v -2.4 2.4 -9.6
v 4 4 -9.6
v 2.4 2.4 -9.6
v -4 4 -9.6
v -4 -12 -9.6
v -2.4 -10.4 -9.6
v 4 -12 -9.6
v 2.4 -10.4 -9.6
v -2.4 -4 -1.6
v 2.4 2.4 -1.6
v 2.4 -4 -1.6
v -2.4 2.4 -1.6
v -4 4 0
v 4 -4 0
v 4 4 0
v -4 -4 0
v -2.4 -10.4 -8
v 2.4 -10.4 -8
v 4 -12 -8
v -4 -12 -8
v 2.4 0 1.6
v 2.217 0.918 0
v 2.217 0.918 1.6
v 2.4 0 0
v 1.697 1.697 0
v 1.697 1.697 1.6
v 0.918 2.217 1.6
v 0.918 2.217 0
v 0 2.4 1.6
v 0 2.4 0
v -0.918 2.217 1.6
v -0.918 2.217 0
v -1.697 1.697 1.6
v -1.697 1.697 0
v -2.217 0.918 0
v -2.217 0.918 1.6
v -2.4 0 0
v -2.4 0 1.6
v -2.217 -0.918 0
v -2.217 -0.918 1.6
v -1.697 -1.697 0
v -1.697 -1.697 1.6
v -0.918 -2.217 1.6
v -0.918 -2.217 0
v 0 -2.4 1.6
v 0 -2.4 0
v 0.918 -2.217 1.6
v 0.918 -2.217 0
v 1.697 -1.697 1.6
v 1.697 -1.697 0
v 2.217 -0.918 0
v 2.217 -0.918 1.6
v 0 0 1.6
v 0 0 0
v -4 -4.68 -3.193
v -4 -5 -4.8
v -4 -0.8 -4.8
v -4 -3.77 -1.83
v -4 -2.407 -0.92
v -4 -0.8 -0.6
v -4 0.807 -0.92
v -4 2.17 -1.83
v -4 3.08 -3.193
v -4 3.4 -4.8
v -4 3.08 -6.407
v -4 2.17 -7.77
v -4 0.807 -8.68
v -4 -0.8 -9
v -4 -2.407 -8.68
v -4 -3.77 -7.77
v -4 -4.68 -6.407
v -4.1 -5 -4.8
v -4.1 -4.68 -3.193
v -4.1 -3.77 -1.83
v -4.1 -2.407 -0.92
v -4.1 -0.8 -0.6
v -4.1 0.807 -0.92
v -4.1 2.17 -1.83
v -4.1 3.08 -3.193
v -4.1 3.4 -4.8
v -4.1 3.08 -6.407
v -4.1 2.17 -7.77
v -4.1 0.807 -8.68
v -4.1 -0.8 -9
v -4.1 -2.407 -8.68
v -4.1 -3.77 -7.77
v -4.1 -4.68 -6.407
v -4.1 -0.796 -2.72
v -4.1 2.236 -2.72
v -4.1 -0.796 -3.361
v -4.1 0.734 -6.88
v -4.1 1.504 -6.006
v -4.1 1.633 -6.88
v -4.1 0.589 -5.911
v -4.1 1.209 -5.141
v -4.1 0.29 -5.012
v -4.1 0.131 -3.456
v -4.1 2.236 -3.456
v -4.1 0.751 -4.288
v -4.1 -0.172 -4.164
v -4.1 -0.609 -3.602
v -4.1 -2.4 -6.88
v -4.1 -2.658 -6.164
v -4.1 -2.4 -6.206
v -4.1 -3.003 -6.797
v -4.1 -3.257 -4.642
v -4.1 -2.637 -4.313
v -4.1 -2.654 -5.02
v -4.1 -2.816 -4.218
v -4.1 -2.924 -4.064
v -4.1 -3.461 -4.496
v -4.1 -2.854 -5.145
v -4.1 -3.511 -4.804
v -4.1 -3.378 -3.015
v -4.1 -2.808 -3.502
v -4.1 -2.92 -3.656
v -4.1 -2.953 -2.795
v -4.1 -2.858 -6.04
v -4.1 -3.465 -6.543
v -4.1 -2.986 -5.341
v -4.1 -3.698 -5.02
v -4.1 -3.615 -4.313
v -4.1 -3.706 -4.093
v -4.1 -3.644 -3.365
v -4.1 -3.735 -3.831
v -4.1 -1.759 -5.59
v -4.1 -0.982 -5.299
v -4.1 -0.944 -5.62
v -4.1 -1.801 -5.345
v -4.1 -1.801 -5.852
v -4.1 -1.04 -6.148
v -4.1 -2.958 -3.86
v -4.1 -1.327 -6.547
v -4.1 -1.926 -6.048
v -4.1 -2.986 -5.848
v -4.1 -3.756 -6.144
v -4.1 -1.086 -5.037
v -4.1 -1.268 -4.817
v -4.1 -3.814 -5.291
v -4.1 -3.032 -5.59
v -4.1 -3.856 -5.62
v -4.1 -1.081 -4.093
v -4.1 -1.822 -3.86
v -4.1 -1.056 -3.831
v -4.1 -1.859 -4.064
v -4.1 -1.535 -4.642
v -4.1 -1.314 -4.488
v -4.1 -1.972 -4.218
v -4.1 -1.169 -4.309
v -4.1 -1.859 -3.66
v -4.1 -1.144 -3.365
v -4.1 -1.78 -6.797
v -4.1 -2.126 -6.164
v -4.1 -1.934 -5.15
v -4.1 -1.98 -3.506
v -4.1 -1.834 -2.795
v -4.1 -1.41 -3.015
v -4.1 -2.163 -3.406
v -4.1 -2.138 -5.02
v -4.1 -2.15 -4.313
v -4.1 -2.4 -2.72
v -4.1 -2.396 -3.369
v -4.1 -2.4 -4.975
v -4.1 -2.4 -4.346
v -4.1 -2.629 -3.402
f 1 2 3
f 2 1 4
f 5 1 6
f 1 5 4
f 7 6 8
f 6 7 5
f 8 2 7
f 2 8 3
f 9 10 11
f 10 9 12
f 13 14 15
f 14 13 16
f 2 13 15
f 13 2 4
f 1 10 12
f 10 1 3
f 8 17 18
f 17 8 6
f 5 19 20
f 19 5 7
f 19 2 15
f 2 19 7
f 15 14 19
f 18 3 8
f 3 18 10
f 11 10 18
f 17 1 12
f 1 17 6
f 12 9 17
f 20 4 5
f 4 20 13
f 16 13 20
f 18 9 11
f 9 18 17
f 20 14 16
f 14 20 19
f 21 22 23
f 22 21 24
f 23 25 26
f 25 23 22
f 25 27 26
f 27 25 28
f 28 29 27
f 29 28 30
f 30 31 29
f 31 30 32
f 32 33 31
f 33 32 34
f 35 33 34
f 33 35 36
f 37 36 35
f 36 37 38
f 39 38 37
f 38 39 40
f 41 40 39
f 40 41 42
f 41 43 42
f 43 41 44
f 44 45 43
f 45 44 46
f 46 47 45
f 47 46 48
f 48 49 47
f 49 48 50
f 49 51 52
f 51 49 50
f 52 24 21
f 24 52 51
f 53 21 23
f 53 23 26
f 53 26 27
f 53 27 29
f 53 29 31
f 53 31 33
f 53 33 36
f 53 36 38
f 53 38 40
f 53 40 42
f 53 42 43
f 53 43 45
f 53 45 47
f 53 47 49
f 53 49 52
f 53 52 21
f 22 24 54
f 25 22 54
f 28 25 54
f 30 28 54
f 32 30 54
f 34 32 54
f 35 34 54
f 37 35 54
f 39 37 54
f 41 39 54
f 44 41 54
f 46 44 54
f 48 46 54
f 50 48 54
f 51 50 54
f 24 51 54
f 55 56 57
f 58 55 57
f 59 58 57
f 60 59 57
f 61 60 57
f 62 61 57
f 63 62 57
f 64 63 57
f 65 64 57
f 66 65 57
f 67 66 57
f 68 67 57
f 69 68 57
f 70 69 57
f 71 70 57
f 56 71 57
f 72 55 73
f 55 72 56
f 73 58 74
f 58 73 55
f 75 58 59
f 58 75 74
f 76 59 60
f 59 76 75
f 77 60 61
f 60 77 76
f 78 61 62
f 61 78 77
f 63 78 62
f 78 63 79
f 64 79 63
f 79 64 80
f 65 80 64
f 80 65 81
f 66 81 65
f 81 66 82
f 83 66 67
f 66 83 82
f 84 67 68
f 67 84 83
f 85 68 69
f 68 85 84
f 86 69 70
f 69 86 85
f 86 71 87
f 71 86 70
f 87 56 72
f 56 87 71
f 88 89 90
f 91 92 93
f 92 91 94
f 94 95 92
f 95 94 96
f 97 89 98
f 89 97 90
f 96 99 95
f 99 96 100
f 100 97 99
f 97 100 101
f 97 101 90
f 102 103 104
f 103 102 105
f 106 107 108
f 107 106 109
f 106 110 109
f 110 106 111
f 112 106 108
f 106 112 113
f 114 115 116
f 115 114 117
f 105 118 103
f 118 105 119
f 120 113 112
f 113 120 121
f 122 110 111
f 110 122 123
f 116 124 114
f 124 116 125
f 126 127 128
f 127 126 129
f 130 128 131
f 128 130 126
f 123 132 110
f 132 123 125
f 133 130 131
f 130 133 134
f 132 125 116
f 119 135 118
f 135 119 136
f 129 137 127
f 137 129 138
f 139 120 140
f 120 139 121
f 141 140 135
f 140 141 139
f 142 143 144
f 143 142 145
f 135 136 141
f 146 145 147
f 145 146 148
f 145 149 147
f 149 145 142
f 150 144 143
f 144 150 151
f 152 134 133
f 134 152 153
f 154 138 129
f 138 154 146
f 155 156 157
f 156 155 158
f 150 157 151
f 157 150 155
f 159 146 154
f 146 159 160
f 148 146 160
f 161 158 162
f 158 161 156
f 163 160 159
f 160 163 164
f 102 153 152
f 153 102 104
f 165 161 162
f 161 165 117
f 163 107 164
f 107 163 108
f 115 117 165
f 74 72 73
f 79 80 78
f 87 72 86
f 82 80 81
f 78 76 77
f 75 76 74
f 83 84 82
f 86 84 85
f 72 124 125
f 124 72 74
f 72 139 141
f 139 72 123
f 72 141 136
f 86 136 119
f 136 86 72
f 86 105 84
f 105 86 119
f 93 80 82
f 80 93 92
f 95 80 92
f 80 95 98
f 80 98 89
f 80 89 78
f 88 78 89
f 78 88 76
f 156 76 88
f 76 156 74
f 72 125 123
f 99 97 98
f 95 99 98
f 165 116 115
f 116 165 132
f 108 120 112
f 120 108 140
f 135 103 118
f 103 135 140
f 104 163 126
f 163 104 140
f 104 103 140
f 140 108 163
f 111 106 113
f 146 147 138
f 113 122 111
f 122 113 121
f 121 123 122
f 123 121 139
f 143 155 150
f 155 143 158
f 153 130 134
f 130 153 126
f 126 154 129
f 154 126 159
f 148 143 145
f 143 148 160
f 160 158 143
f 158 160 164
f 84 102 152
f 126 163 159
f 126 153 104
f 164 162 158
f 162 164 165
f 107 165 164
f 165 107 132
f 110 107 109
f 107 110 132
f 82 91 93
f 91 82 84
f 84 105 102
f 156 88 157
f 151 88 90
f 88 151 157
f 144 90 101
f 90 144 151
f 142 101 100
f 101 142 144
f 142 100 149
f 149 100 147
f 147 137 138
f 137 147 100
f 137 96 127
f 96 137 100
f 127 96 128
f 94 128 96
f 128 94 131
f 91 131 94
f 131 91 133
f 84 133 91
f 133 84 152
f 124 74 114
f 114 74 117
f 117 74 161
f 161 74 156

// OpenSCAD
// file: ../p/4-4edge.scad
use <../lib.scad>
function ldraw_lib__4_4edge() = [
// 0 Circle 1.0
// 0 Name: 4-4edge.dat
// 0 Author: James Jessiman
// 0 !LDRAW_ORG Primitive UPDATE 2017-01
// 0 !LICENSE Licensed under CC BY 2.0 and CC BY 4.0 : see CAreadme.txt
// 
// 0 BFC CERTIFY CCW
  [0,"BFC","CERTIFY"],
  [0,"BFC","CCW"],
// 
// 0 !HISTORY 1998-12-15 [PTadmin] Official Update 1998-10
// 0 !HISTORY 2005-12-28 [PTadmin] Official Update 2005-01
// 0 !HISTORY 2007-06-24 [PTadmin] Header formatted for Contributor Agreement
// 0 !HISTORY 2008-07-01 [PTadmin] Official Update 2008-01
// 0 !HISTORY 2017-01-15 [Steffen] BFCed
// 0 !HISTORY 2017-12-30 [PTadmin] Official Update 2017-01
// 
// 
// 2 24 1 0 0 0.9239 0 0.3827
  [2,24,1,0,0,0.9239,0,0.3827],
// 2 24 0.9239 0 0.3827 0.7071 0 0.7071
  [2,24,0.9239,0,0.3827,0.7071,0,0.7071],
// 2 24 0.7071 0 0.7071 0.3827 0 0.9239
  [2,24,0.7071,0,0.7071,0.3827,0,0.9239],
// 2 24 0.3827 0 0.9239 0 0 1
  [2,24,0.3827,0,0.9239,0,0,1],
// 2 24 0 0 1 -0.3827 0 0.9239
  [2,24,0,0,1,-0.3827,0,0.9239],
// 2 24 -0.3827 0 0.9239 -0.7071 0 0.7071
  [2,24,-0.3827,0,0.9239,-0.7071,0,0.7071],
// 2 24 -0.7071 0 0.7071 -0.9239 0 0.3827
  [2,24,-0.7071,0,0.7071,-0.9239,0,0.3827],
// 2 24 -0.9239 0 0.3827 -1 0 -0
  [2,24,-0.9239,0,0.3827,-1,0,-0],
// 2 24 -1 0 -0 -0.9239 0 -0.3827
  [2,24,-1,0,-0,-0.9239,0,-0.3827],
// 2 24 -0.9239 0 -0.3827 -0.7071 0 -0.7071
  [2,24,-0.9239,0,-0.3827,-0.7071,0,-0.7071],
// 2 24 -0.7071 0 -0.7071 -0.3827 0 -0.9239
  [2,24,-0.7071,0,-0.7071,-0.3827,0,-0.9239],
// 2 24 -0.3827 0 -0.9239 0 0 -1
  [2,24,-0.3827,0,-0.9239,0,0,-1],
// 2 24 0 0 -1 0.3827 0 -0.9239
  [2,24,0,0,-1,0.3827,0,-0.9239],
// 2 24 0.3827 0 -0.9239 0.7071 0 -0.7071
  [2,24,0.3827,0,-0.9239,0.7071,0,-0.7071],
// 2 24 0.7071 0 -0.7071 0.9239 0 -0.3827
  [2,24,0.7071,0,-0.7071,0.9239,0,-0.3827],
// 2 24 0.9239 0 -0.3827 1 0 0
  [2,24,0.9239,0,-0.3827,1,0,0],
];
module ldraw_lib__4_4edge(step=0, col=false, unit=2/5, alt=false, line=0.2, solid=!$preview)
    makepoly(ldraw_lib__4_4edge(), step=step, col=col, unit=unit, alt=alt, line=line, solid=solid);
ldraw_lib__4_4edge(line=0.2);
// file: ../p/4-4disc.scad
use <../lib.scad>
function ldraw_lib__4_4disc() = [
// 0 Disc 1.0
// 0 Name: 4-4disc.dat
// 0 Author: James Jessiman
// 0 !LDRAW_ORG Primitive UPDATE 2002-02
// 0 !LICENSE Licensed under CC BY 2.0 and CC BY 4.0 : see CAreadme.txt
// 
// 0 BFC CERTIFY CCW
  [0,"BFC","CERTIFY"],
  [0,"BFC","CCW"],
// 
// 0 !HISTORY 1998-12-15 [PTadmin] Official Update 1998-10
// 0 !HISTORY 2002-03-23 [sbliss] Added BFC statement
// 0 !HISTORY 2002-04-25 [PTadmin] Official Update 2002-02
// 0 !HISTORY 2007-06-24 [PTadmin] Header formatted for Contributor Agreement
// 0 !HISTORY 2008-07-01 [PTadmin] Official Update 2008-01
// 
// 
// 3 16 0 0 0 1 0 0 0.9239 0 0.3827
  [3,16,0,0,0,1,0,0,0.9239,0,0.3827],
// 3 16 0 0 0 0.9239 0 0.3827 0.7071 0 0.7071
  [3,16,0,0,0,0.9239,0,0.3827,0.7071,0,0.7071],
// 3 16 0 0 0 0.7071 0 0.7071 0.3827 0 0.9239
  [3,16,0,0,0,0.7071,0,0.7071,0.3827,0,0.9239],
// 3 16 0 0 0 0.3827 0 0.9239 0 0 1
  [3,16,0,0,0,0.3827,0,0.9239,0,0,1],
// 3 16 0 0 0 0 0 1 -0.3827 0 0.9239
  [3,16,0,0,0,0,0,1,-0.3827,0,0.9239],
// 3 16 0 0 0 -0.3827 0 0.9239 -0.7071 0 0.7071
  [3,16,0,0,0,-0.3827,0,0.9239,-0.7071,0,0.7071],
// 3 16 0 0 0 -0.7071 0 0.7071 -0.9239 0 0.3827
  [3,16,0,0,0,-0.7071,0,0.7071,-0.9239,0,0.3827],
// 3 16 0 0 0 -0.9239 0 0.3827 -1 0 -0
  [3,16,0,0,0,-0.9239,0,0.3827,-1,0,-0],
// 3 16 0 0 0 -1 0 -0 -0.9239 0 -0.3827
  [3,16,0,0,0,-1,0,-0,-0.9239,0,-0.3827],
// 3 16 0 0 0 -0.9239 0 -0.3827 -0.7071 0 -0.7071
  [3,16,0,0,0,-0.9239,0,-0.3827,-0.7071,0,-0.7071],
// 3 16 0 0 0 -0.7071 0 -0.7071 -0.3827 0 -0.9239
  [3,16,0,0,0,-0.7071,0,-0.7071,-0.3827,0,-0.9239],
// 3 16 0 0 0 -0.3827 0 -0.9239 0 0 -1
  [3,16,0,0,0,-0.3827,0,-0.9239,0,0,-1],
// 3 16 0 0 0 0 0 -1 0.3827 0 -0.9239
  [3,16,0,0,0,0,0,-1,0.3827,0,-0.9239],
// 3 16 0 0 0 0.3827 0 -0.9239 0.7071 0 -0.7071
  [3,16,0,0,0,0.3827,0,-0.9239,0.7071,0,-0.7071],
// 3 16 0 0 0 0.7071 0 -0.7071 0.9239 0 -0.3827
  [3,16,0,0,0,0.7071,0,-0.7071,0.9239,0,-0.3827],
// 3 16 0 0 0 0.9239 0 -0.3827 1 0 0
  [3,16,0,0,0,0.9239,0,-0.3827,1,0,0],
// 0
];
module ldraw_lib__4_4disc(step=0, col=false, unit=2/5, alt=false, line=0.2, solid=!$preview)
    makepoly(ldraw_lib__4_4disc(), step=step, col=col, unit=unit, alt=alt, line=line, solid=solid);
ldraw_lib__4_4disc(line=0.2);
// file: ../p/4-4cyli.scad
use <../lib.scad>
$fa=1; $fs=0.2;
function ldraw_lib__4_4cyli(realsolid=false) = [
// 0 Cylinder 1.0
// 0 Name: 4-4cyli.dat
// 0 Author: James Jessiman
// 0 !LDRAW_ORG Primitive UPDATE 2005-01
// 0 !LICENSE Licensed under CC BY 2.0 and CC BY 4.0 : see CAreadme.txt
// 
// 0 BFC CERTIFY CCW
  [0,"BFC","CERTIFY"],
  [0,"BFC","CCW"],
// 
// 0 !HISTORY 1998-12-15 [PTadmin] Official Update 1998-10
// 0 !HISTORY 2002-03-23 [sbliss] Added BFC statement; merged headers from files in distributions LDraw 0.27 and Complete.
// 0 !HISTORY 2002-04-25 [PTadmin] Official Update 2002-02
// 0 !HISTORY 2004-12-14 [guyvivan] BFC CCW
// 0 !HISTORY 2005-12-28 [PTadmin] Official Update 2005-01
// 0 !HISTORY 2007-06-24 [PTadmin] Header formatted for Contributor Agreement
// 0 !HISTORY 2008-07-01 [PTadmin] Official Update 2008-01
// 
// 
// 4 16 1 1 0 0.9239 1 0.3827 0.9239 0 0.3827 1 0 0
  [4,16,1,1,0,0.9239,1,0.3827,0.9239,0,0.3827,1,0,0],
// 5 24 1 0 0 1 1 0 0.9239 0 0.3827 0.9239 0 -0.3827
  [5,24,1,0,0,1,1,0,0.9239,0,0.3827,0.9239,0,-0.3827],
// 4 16 0.9239 1 0.3827 0.7071 1 0.7071 0.7071 0 0.7071 0.9239 0 0.3827
  [4,16,0.9239,1,0.3827,0.7071,1,0.7071,0.7071,0,0.7071,0.9239,0,0.3827],
// 5 24 0.9239 0 0.3827 0.9239 1 0.3827 0.7071 0 0.7071 1 0 0
  [5,24,0.9239,0,0.3827,0.9239,1,0.3827,0.7071,0,0.7071,1,0,0],
// 4 16 0.7071 1 0.7071 0.3827 1 0.9239 0.3827 0 0.9239 0.7071 0 0.7071
  [4,16,0.7071,1,0.7071,0.3827,1,0.9239,0.3827,0,0.9239,0.7071,0,0.7071],
// 5 24 0.7071 0 0.7071 0.7071 1 0.7071 0.3827 0 0.9239 0.9239 0 0.3827
  [5,24,0.7071,0,0.7071,0.7071,1,0.7071,0.3827,0,0.9239,0.9239,0,0.3827],
// 4 16 0.3827 1 0.9239 0 1 1 0 0 1 0.3827 0 0.9239
  [4,16,0.3827,1,0.9239,0,1,1,0,0,1,0.3827,0,0.9239],
// 5 24 0.3827 0 0.9239 0.3827 1 0.9239 0 0 1 0.7071 0 0.7071
  [5,24,0.3827,0,0.9239,0.3827,1,0.9239,0,0,1,0.7071,0,0.7071],
// 4 16 0 1 1 -0.3827 1 0.9239 -0.3827 0 0.9239 0 0 1
  [4,16,0,1,1,-0.3827,1,0.9239,-0.3827,0,0.9239,0,0,1],
// 5 24 0 0 1 0 1 1 -0.3827 0 0.9239 0.3827 0 0.9239
  [5,24,0,0,1,0,1,1,-0.3827,0,0.9239,0.3827,0,0.9239],
// 4 16 -0.3827 1 0.9239 -0.7071 1 0.7071 -0.7071 0 0.7071 -0.3827 0 0.9239
  [4,16,-0.3827,1,0.9239,-0.7071,1,0.7071,-0.7071,0,0.7071,-0.3827,0,0.9239],
// 5 24 -0.3827 0 0.9239 -0.3827 1 0.9239 -0.7071 0 0.7071 0 0 1
  [5,24,-0.3827,0,0.9239,-0.3827,1,0.9239,-0.7071,0,0.7071,0,0,1],
// 4 16 -0.7071 1 0.7071 -0.9239 1 0.3827 -0.9239 0 0.3827 -0.7071 0 0.7071
  [4,16,-0.7071,1,0.7071,-0.9239,1,0.3827,-0.9239,0,0.3827,-0.7071,0,0.7071],
// 5 24 -0.7071 0 0.7071 -0.7071 1 0.7071 -0.9239 0 0.3827 -0.3827 0 0.9239
  [5,24,-0.7071,0,0.7071,-0.7071,1,0.7071,-0.9239,0,0.3827,-0.3827,0,0.9239],
// 4 16 -0.9239 1 0.3827 -1 1 0 -1 0 0 -0.9239 0 0.3827
  [4,16,-0.9239,1,0.3827,-1,1,0,-1,0,0,-0.9239,0,0.3827],
// 5 24 -0.9239 0 0.3827 -0.9239 1 0.3827 -1 0 0 -0.7071 0 0.7071
  [5,24,-0.9239,0,0.3827,-0.9239,1,0.3827,-1,0,0,-0.7071,0,0.7071],
// 4 16 -1 1 0 -0.9239 1 -0.3827 -0.9239 0 -0.3827 -1 0 0
  [4,16,-1,1,0,-0.9239,1,-0.3827,-0.9239,0,-0.3827,-1,0,0],
// 5 24 -1 0 0 -1 1 0 -0.9239 0 -0.3827 -0.9239 0 0.3827
  [5,24,-1,0,0,-1,1,0,-0.9239,0,-0.3827,-0.9239,0,0.3827],
// 4 16 -0.9239 1 -0.3827 -0.7071 1 -0.7071 -0.7071 0 -0.7071 -0.9239 0 -0.3827
  [4,16,-0.9239,1,-0.3827,-0.7071,1,-0.7071,-0.7071,0,-0.7071,-0.9239,0,-0.3827],
// 5 24 -0.9239 0 -0.3827 -0.9239 1 -0.3827 -0.7071 0 -0.7071 -1 0 0
  [5,24,-0.9239,0,-0.3827,-0.9239,1,-0.3827,-0.7071,0,-0.7071,-1,0,0],
// 4 16 -0.7071 1 -0.7071 -0.3827 1 -0.9239 -0.3827 0 -0.9239 -0.7071 0 -0.7071
  [4,16,-0.7071,1,-0.7071,-0.3827,1,-0.9239,-0.3827,0,-0.9239,-0.7071,0,-0.7071],
// 5 24 -0.7071 0 -0.7071 -0.7071 1 -0.7071 -0.3827 0 -0.9239 -0.9239 0 -0.3827
  [5,24,-0.7071,0,-0.7071,-0.7071,1,-0.7071,-0.3827,0,-0.9239,-0.9239,0,-0.3827],
// 4 16 -0.3827 1 -0.9239 0 1 -1 0 0 -1 -0.3827 0 -0.9239
  [4,16,-0.3827,1,-0.9239,0,1,-1,0,0,-1,-0.3827,0,-0.9239],
// 5 24 -0.3827 0 -0.9239 -0.3827 1 -0.9239 0 0 -1 -0.7071 0 -0.7071
  [5,24,-0.3827,0,-0.9239,-0.3827,1,-0.9239,0,0,-1,-0.7071,0,-0.7071],
// 4 16 0 1 -1 0.3827 1 -0.9239 0.3827 0 -0.9239 0 0 -1
  [4,16,0,1,-1,0.3827,1,-0.9239,0.3827,0,-0.9239,0,0,-1],
// 5 24 0 0 -1 0 1 -1 0.3827 0 -0.9239 -0.3827 0 -0.9239
  [5,24,0,0,-1,0,1,-1,0.3827,0,-0.9239,-0.3827,0,-0.9239],
// 4 16 0.3827 1 -0.9239 0.7071 1 -0.7071 0.7071 0 -0.7071 0.3827 0 -0.9239
  [4,16,0.3827,1,-0.9239,0.7071,1,-0.7071,0.7071,0,-0.7071,0.3827,0,-0.9239],
// 5 24 0.3827 0 -0.9239 0.3827 1 -0.9239 0.7071 0 -0.7071 0 0 -1
  [5,24,0.3827,0,-0.9239,0.3827,1,-0.9239,0.7071,0,-0.7071,0,0,-1],
// 4 16 0.7071 1 -0.7071 0.9239 1 -0.3827 0.9239 0 -0.3827 0.7071 0 -0.7071
  [4,16,0.7071,1,-0.7071,0.9239,1,-0.3827,0.9239,0,-0.3827,0.7071,0,-0.7071],
// 5 24 0.7071 0 -0.7071 0.7071 1 -0.7071 0.9239 0 -0.3827 0.3827 0 -0.9239
  [5,24,0.7071,0,-0.7071,0.7071,1,-0.7071,0.9239,0,-0.3827,0.3827,0,-0.9239],
// 4 16 0.9239 1 -0.3827 1 1 0 1 0 0 0.9239 0 -0.3827
  [4,16,0.9239,1,-0.3827,1,1,0,1,0,0,0.9239,0,-0.3827],
// 5 24 0.9239 0 -0.3827 0.9239 1 -0.3827 1 0 0 0.7071 0 -0.7071
  [5,24,0.9239,0,-0.3827,0.9239,1,-0.3827,1,0,0,0.7071,0,-0.7071],
// 0
];
module ldraw_lib__4_4cyli(step=0, col=false, unit=2/5, alt=false, line=0.2, solid=!$preview)
    makepoly(ldraw_lib__4_4cyli(solid), step=step, col=col, unit=unit, alt=alt, line=line, solid=solid);
ldraw_lib__4_4cyli(line=0.2);
// file: ../p/stud.scad
use <../lib.scad>
use <4-4cyli.scad>
use <4-4disc.scad>
use <4-4edge.scad>
function ldraw_lib__stud() = [
// 0 Stud
// 0 Name: stud.dat
// 0 Author: James Jessiman
// 0 !LDRAW_ORG Primitive UPDATE 2012-01
// 0 !LICENSE Licensed under CC BY 4.0 : see CAreadme.txt
// 
// 0 BFC CERTIFY CCW
  [0,"BFC","CERTIFY"],
  [0,"BFC","CCW"],
// 
// 0 !HISTORY 2002-04-04 [sbliss] Modified for BFC compliance
// 0 !HISTORY 2002-04-25 [PTadmin] Official Update 2002-02
// 0 !HISTORY 2007-06-24 [PTadmin] Header formatted for Contributor Agreement
// 0 !HISTORY 2008-07-01 [PTadmin] Official Update 2008-01
// 0 !HISTORY 2012-02-16 [Philo] Changed to CCW
// 0 !HISTORY 2012-03-30 [PTadmin] Official Update 2012-01
// 
// 
// 1 16 0 0 0 6 0 0 0 1 0 0 0 6 4-4edge.dat
  [1,16,0,0,0,6,0,0,0,1,0,0,0,6, ldraw_lib__4_4edge()],
// 1 16 0 -4 0 6 0 0 0 1 0 0 0 6 4-4edge.dat
  [1,16,0,-4,0,6,0,0,0,1,0,0,0,6, ldraw_lib__4_4edge()],
// 1 16 0 0 0 6 0 0 0 -4 0 0 0 6 4-4cyli.dat
  [1,16,0,0,0,6,0,0,0,-4,0,0,0,6, ldraw_lib__4_4cyli()],
// 1 16 0 -4 0 6 0 0 0 1 0 0 0 6 4-4disc.dat
  [1,16,0,-4,0,6,0,0,0,1,0,0,0,6, ldraw_lib__4_4disc()],
  [-1,16,0,0,0,6,0,0,0,-1,0,0,0,6, ldraw_lib__4_4disc()],
];
module ldraw_lib__stud(step=0, col=false, unit=2/5, alt=false, line=0.2, solid=!$preview)
    makepoly(ldraw_lib__stud(), step=step, col=col, unit=unit, alt=alt, line=line, solid=solid);
ldraw_lib__stud(line=0.2);
// file: ../p/4-4cylc3.scad
use <../lib.scad>
use <4-4cyli.scad>
use <4-4disc.scad>
function ldraw_lib__4_4cylc3() = [
// 0 Cylinder Closed 1.0 without Top or Bottom Edge Lines
// 0 Name: 4-4cylc3.dat
// 0 Author: Chris Dee [cwdee]
// 0 !LDRAW_ORG Primitive UPDATE 2017-01
// 0 !LICENSE Licensed under CC BY 4.0 : see CAreadme.txt
// 
// 0 BFC CERTIFY CCW
  [0,"BFC","CERTIFY"],
  [0,"BFC","CCW"],
// 
// 0 !HISTORY 2017-12-30 [PTadmin] Official Update 2017-01
// 
// 
// 1 16 0 0 0 1 0 0 0 1 0 0 0 1 4-4disc.dat
  [1,16,0,0,0,1,0,0,0,1,0,0,0,1, ldraw_lib__4_4disc()],
// 1 16 0 0 0 1 0 0 0 1 0 0 0 1 4-4cyli.dat
  [1,16,0,0,0,1,0,0,0,1,0,0,0,1, ldraw_lib__4_4cyli()],
// 0
];
module ldraw_lib__4_4cylc3(step=0, col=false, unit=2/5, alt=false, line=0.2, solid=!$preview)
    makepoly(ldraw_lib__4_4cylc3(), step=step, col=col, unit=unit, alt=alt, line=line, solid=solid);
ldraw_lib__4_4cylc3(line=0.2);
// file: ../p/1-8chrd.scad
use <../lib.scad>
$fa=1; $fs=0.2;
function ldraw_lib__1_8chrd(realsolid=false) = [
// 0 Chord 0.125
// 0 Name: 1-8chrd.dat
// 0 Author: Andy Westrate [westrate]
// 0 !LDRAW_ORG Primitive UPDATE 2004-02
// 0 !LICENSE Licensed under CC BY 2.0 and CC BY 4.0 : see CAreadme.txt
// 
// 0 BFC CERTIFY CCW
  [0,"BFC","CERTIFY"],
  [0,"BFC","CCW"],
// 
// 0 !HISTORY 2004-04-22 [PTadmin] Official Update 2004-02
// 0 !HISTORY 2007-06-22 [PTadmin] Header formatted for Contributor Agreement
// 0 !HISTORY 2008-07-01 [PTadmin] Official Update 2008-01
// 
// 
// 3 16 0.7071 0 0.7071 1 0 0 0.9239 0 0.3827
  [3,16,0.7071,0,0.7071,1,0,0,0.9239,0,0.3827],
// 
// 0
];
module ldraw_lib__1_8chrd(step=0, col=false, unit=2/5, alt=false, line=0.2, solid=!$preview)
    makepoly(ldraw_lib__1_8chrd(solid), step=step, col=col, unit=unit, alt=alt, line=line, solid=solid);
ldraw_lib__1_8chrd(line=0.2);
// file: 3040a.scad
use <../lib.scad>
use <../p/stud.scad>
function ldraw_lib__3040a() = [
// 0 Slope Brick 45  2 x  1 without Centre Stud
// 0 Name: 3040a.dat
// 0 Author: Michael Heidemann [mikeheide]
// 0 !LDRAW_ORG Part UPDATE 2004-04
// 0 !LICENSE Licensed under CC BY 4.0 : see CAreadme.txt
// 
// 0 BFC CERTIFY CCW
  [0,"BFC","CERTIFY"],
  [0,"BFC","CCW"],
// 
// 0 !HISTORY 2004-11-06 [PTadmin] Official Update 2004-04
// 0 !HISTORY 2007-06-09 [PTadmin] Header formatted for Contributor Agreement
// 0 !HISTORY 2008-07-01 [PTadmin] Official Update 2008-01
// 
// 
// 2 24 6 24 6 -6 24 6
  [2,24,6,24,6,-6,24,6],
// 2 24 -6 24 6 -6 24 -26
  [2,24,-6,24,6,-6,24,-26],
// 2 24 -6 24 -26 6 24 -26
  [2,24,-6,24,-26,6,24,-26],
// 2 24 6 24 -26 6 24 6
  [2,24,6,24,-26,6,24,6],
// 2 24 10 24 10 -10 24 10
  [2,24,10,24,10,-10,24,10],
// 2 24 -10 24 10 -10 24 -30
  [2,24,-10,24,10,-10,24,-30],
// 2 24 -10 24 -30 10 24 -30
  [2,24,-10,24,-30,10,24,-30],
// 2 24 10 24 -30 10 24 10
  [2,24,10,24,-30,10,24,10],
// 2 24 6 24 6 6 4 6
  [2,24,6,24,6,6,4,6],
// 2 24 -6 24 6 -6 4 6
  [2,24,-6,24,6,-6,4,6],
// 2 24 6 24 -26 6 20 -26
  [2,24,6,24,-26,6,20,-26],
// 2 24 -6 24 -26 -6 20 -26
  [2,24,-6,24,-26,-6,20,-26],
// 2 24 6 4 6 -6 4 6
  [2,24,6,4,6,-6,4,6],
// 2 24 6 4 -10 -6 4 -10
  [2,24,6,4,-10,-6,4,-10],
// 2 24 6 20 -26 -6 20 -26
  [2,24,6,20,-26,-6,20,-26],
// 2 24 6 4 6 6 4 -10
  [2,24,6,4,6,6,4,-10],
// 2 24 -6 4 6 -6 4 -10
  [2,24,-6,4,6,-6,4,-10],
// 2 24 6 20 -26 6 4 -10
  [2,24,6,20,-26,6,4,-10],
// 2 24 -6 20 -26 -6 4 -10
  [2,24,-6,20,-26,-6,4,-10],
// 2 24 10 24 10 10 0 10
  [2,24,10,24,10,10,0,10],
// 2 24 -10 24 10 -10 0 10
  [2,24,-10,24,10,-10,0,10],
// 2 24 10 24 -30 10 20 -30
  [2,24,10,24,-30,10,20,-30],
// 2 24 -10 24 -30 -10 20 -30
  [2,24,-10,24,-30,-10,20,-30],
// 2 24 10 0 10 -10 0 10
  [2,24,10,0,10,-10,0,10],
// 2 24 10 0 -10 -10 0 -10
  [2,24,10,0,-10,-10,0,-10],
// 2 24 10 20 -30 -10 20 -30
  [2,24,10,20,-30,-10,20,-30],
// 2 24 10 0 10 10 0 -10
  [2,24,10,0,10,10,0,-10],
// 2 24 -10 0 10 -10 0 -10
  [2,24,-10,0,10,-10,0,-10],
// 2 24 10 20 -30 10 0 -10
  [2,24,10,20,-30,10,0,-10],
// 2 24 -10 20 -30 -10 0 -10
  [2,24,-10,20,-30,-10,0,-10],
// 4 16 10 24 10 6 24 6 -6 24 6 -10 24 10
  [4,16,10,24,10,6,24,6,-6,24,6,-10,24,10],
// 4 16 -10 24 10 -6 24 6 -6 24 -26 -10 24 -30
  [4,16,-10,24,10,-6,24,6,-6,24,-26,-10,24,-30],
// 4 16 -10 24 -30 -6 24 -26 6 24 -26 10 24 -30
  [4,16,-10,24,-30,-6,24,-26,6,24,-26,10,24,-30],
// 4 16 10 24 -30 6 24 -26 6 24 6 10 24 10
  [4,16,10,24,-30,6,24,-26,6,24,6,10,24,10],
// 4 16 6 4 6 6 4 -10 -6 4 -10 -6 4 6
  [4,16,6,4,6,6,4,-10,-6,4,-10,-6,4,6],
// 4 16 10 0 -10 10 0 10 -10 0 10 -10 0 -10
  [4,16,10,0,-10,10,0,10,-10,0,10,-10,0,-10],
// 4 16 -10 24 10 -10 0 10 10 0 10 10 24 10
  [4,16,-10,24,10,-10,0,10,10,0,10,10,24,10],
// 4 16 6 24 6 6 4 6 -6 4 6 -6 24 6
  [4,16,6,24,6,6,4,6,-6,4,6,-6,24,6],
// 4 16 -6 24 -26 -6 20 -26 6 20 -26 6 24 -26
  [4,16,-6,24,-26,-6,20,-26,6,20,-26,6,24,-26],
// 4 16 10 24 -30 10 20 -30 -10 20 -30 -10 24 -30
  [4,16,10,24,-30,10,20,-30,-10,20,-30,-10,24,-30],
// 4 16 10 24 10 10 0 10 10 20 -30 10 24 -30
  [4,16,10,24,10,10,0,10,10,20,-30,10,24,-30],
// 3 16 10 0 10 10 0 -10 10 20 -30
  [3,16,10,0,10,10,0,-10,10,20,-30],
// 4 16 6 24 -26 6 20 -26 6 4 6 6 24 6
  [4,16,6,24,-26,6,20,-26,6,4,6,6,24,6],
// 3 16 6 4 -10 6 4 6 6 20 -26
  [3,16,6,4,-10,6,4,6,6,20,-26],
// 4 16 -6 24 6 -6 4 6 -6 20 -26 -6 24 -26
  [4,16,-6,24,6,-6,4,6,-6,20,-26,-6,24,-26],
// 3 16 -6 4 6 -6 4 -10 -6 20 -26
  [3,16,-6,4,6,-6,4,-10,-6,20,-26],
// 4 16 -10 24 -30 -10 20 -30 -10 0 10 -10 24 10
  [4,16,-10,24,-30,-10,20,-30,-10,0,10,-10,24,10],
// 3 16 -10 0 -10 -10 0 10 -10 20 -30
  [3,16,-10,0,-10,-10,0,10,-10,20,-30],
// 4 16 6 4 -10 6 20 -26 -6 20 -26 -6 4 -10
  [4,16,6,4,-10,6,20,-26,-6,20,-26,-6,4,-10],
// 4 16 10 20 -30 10 0 -10 -10 0 -10 -10 20 -30
  [4,16,10,20,-30,10,0,-10,-10,0,-10,-10,20,-30],
// 1 16 0 0 0 1 0 0 0 1 0 0 0 1 stud.dat
  [1,16,0,0,0,1,0,0,0,1,0,0,0,1, ldraw_lib__stud()],
// 0
];
module ldraw_lib__3040a(step=0, col=false, unit=2/5, alt=false, line=0.2, solid=!$preview)
    makepoly(ldraw_lib__3040a(), step=step, col=col, unit=unit, alt=alt, line=line, solid=solid);
ldraw_lib__3040a(line=0.2);
// main file
use <../lib.scad>
use <003667d.scad>
use <3040a.scad>
function ldraw_lib__3040ad03() = [
// 0 Slope Brick 45  2 x  1 with "78" Left Sticker
// 0 Name: 3040ad03.dat
// 0 Author: Takeshi Takahashi [RainbowDolphin]
// 0 !LDRAW_ORG Shortcut UPDATE 2024-10
// 0 !LICENSE Licensed under CC BY 4.0 : see CAreadme.txt
// 
// 0 BFC CERTIFY CCW
  [0,"BFC","CERTIFY"],
  [0,"BFC","CCW"],
// 
// 0 !CATEGORY Sticker Shortcut
// 0 !KEYWORDS Bricklink 3040apb02L, Rally Car, Set 619-1
// 
// 0 !HISTORY 2024-12-01 [OrionP] Official Update 2024-10
// 
// 1 16 0 0 0 1 0 0 0 1 0 0 0 1 3040a.dat
  [1,16,0,0,0,1,0,0,0,1,0,0,0,1, ldraw_lib__3040a()],
// 0 // 1 16 10 12 -2 0 -1 0 0 0 -1 1 0 0 003667d.dat
// 1 16 -10 12 -2 0 1 0 0 0 -1 -1 0 0 003667d.dat
  [1,16,-10,12,-2,0,1,0,0,0,-1,-1,0,0, ldraw_lib__003667d()],
];
module ldraw_lib__3040ad03(step=0, col=false, unit=2/5, alt=false, line=0.2, solid=!$preview)
    makepoly(ldraw_lib__3040ad03(), step=step, col=col, unit=unit, alt=alt, line=line, solid=solid);
ldraw_lib__3040ad03(line=0.2);
